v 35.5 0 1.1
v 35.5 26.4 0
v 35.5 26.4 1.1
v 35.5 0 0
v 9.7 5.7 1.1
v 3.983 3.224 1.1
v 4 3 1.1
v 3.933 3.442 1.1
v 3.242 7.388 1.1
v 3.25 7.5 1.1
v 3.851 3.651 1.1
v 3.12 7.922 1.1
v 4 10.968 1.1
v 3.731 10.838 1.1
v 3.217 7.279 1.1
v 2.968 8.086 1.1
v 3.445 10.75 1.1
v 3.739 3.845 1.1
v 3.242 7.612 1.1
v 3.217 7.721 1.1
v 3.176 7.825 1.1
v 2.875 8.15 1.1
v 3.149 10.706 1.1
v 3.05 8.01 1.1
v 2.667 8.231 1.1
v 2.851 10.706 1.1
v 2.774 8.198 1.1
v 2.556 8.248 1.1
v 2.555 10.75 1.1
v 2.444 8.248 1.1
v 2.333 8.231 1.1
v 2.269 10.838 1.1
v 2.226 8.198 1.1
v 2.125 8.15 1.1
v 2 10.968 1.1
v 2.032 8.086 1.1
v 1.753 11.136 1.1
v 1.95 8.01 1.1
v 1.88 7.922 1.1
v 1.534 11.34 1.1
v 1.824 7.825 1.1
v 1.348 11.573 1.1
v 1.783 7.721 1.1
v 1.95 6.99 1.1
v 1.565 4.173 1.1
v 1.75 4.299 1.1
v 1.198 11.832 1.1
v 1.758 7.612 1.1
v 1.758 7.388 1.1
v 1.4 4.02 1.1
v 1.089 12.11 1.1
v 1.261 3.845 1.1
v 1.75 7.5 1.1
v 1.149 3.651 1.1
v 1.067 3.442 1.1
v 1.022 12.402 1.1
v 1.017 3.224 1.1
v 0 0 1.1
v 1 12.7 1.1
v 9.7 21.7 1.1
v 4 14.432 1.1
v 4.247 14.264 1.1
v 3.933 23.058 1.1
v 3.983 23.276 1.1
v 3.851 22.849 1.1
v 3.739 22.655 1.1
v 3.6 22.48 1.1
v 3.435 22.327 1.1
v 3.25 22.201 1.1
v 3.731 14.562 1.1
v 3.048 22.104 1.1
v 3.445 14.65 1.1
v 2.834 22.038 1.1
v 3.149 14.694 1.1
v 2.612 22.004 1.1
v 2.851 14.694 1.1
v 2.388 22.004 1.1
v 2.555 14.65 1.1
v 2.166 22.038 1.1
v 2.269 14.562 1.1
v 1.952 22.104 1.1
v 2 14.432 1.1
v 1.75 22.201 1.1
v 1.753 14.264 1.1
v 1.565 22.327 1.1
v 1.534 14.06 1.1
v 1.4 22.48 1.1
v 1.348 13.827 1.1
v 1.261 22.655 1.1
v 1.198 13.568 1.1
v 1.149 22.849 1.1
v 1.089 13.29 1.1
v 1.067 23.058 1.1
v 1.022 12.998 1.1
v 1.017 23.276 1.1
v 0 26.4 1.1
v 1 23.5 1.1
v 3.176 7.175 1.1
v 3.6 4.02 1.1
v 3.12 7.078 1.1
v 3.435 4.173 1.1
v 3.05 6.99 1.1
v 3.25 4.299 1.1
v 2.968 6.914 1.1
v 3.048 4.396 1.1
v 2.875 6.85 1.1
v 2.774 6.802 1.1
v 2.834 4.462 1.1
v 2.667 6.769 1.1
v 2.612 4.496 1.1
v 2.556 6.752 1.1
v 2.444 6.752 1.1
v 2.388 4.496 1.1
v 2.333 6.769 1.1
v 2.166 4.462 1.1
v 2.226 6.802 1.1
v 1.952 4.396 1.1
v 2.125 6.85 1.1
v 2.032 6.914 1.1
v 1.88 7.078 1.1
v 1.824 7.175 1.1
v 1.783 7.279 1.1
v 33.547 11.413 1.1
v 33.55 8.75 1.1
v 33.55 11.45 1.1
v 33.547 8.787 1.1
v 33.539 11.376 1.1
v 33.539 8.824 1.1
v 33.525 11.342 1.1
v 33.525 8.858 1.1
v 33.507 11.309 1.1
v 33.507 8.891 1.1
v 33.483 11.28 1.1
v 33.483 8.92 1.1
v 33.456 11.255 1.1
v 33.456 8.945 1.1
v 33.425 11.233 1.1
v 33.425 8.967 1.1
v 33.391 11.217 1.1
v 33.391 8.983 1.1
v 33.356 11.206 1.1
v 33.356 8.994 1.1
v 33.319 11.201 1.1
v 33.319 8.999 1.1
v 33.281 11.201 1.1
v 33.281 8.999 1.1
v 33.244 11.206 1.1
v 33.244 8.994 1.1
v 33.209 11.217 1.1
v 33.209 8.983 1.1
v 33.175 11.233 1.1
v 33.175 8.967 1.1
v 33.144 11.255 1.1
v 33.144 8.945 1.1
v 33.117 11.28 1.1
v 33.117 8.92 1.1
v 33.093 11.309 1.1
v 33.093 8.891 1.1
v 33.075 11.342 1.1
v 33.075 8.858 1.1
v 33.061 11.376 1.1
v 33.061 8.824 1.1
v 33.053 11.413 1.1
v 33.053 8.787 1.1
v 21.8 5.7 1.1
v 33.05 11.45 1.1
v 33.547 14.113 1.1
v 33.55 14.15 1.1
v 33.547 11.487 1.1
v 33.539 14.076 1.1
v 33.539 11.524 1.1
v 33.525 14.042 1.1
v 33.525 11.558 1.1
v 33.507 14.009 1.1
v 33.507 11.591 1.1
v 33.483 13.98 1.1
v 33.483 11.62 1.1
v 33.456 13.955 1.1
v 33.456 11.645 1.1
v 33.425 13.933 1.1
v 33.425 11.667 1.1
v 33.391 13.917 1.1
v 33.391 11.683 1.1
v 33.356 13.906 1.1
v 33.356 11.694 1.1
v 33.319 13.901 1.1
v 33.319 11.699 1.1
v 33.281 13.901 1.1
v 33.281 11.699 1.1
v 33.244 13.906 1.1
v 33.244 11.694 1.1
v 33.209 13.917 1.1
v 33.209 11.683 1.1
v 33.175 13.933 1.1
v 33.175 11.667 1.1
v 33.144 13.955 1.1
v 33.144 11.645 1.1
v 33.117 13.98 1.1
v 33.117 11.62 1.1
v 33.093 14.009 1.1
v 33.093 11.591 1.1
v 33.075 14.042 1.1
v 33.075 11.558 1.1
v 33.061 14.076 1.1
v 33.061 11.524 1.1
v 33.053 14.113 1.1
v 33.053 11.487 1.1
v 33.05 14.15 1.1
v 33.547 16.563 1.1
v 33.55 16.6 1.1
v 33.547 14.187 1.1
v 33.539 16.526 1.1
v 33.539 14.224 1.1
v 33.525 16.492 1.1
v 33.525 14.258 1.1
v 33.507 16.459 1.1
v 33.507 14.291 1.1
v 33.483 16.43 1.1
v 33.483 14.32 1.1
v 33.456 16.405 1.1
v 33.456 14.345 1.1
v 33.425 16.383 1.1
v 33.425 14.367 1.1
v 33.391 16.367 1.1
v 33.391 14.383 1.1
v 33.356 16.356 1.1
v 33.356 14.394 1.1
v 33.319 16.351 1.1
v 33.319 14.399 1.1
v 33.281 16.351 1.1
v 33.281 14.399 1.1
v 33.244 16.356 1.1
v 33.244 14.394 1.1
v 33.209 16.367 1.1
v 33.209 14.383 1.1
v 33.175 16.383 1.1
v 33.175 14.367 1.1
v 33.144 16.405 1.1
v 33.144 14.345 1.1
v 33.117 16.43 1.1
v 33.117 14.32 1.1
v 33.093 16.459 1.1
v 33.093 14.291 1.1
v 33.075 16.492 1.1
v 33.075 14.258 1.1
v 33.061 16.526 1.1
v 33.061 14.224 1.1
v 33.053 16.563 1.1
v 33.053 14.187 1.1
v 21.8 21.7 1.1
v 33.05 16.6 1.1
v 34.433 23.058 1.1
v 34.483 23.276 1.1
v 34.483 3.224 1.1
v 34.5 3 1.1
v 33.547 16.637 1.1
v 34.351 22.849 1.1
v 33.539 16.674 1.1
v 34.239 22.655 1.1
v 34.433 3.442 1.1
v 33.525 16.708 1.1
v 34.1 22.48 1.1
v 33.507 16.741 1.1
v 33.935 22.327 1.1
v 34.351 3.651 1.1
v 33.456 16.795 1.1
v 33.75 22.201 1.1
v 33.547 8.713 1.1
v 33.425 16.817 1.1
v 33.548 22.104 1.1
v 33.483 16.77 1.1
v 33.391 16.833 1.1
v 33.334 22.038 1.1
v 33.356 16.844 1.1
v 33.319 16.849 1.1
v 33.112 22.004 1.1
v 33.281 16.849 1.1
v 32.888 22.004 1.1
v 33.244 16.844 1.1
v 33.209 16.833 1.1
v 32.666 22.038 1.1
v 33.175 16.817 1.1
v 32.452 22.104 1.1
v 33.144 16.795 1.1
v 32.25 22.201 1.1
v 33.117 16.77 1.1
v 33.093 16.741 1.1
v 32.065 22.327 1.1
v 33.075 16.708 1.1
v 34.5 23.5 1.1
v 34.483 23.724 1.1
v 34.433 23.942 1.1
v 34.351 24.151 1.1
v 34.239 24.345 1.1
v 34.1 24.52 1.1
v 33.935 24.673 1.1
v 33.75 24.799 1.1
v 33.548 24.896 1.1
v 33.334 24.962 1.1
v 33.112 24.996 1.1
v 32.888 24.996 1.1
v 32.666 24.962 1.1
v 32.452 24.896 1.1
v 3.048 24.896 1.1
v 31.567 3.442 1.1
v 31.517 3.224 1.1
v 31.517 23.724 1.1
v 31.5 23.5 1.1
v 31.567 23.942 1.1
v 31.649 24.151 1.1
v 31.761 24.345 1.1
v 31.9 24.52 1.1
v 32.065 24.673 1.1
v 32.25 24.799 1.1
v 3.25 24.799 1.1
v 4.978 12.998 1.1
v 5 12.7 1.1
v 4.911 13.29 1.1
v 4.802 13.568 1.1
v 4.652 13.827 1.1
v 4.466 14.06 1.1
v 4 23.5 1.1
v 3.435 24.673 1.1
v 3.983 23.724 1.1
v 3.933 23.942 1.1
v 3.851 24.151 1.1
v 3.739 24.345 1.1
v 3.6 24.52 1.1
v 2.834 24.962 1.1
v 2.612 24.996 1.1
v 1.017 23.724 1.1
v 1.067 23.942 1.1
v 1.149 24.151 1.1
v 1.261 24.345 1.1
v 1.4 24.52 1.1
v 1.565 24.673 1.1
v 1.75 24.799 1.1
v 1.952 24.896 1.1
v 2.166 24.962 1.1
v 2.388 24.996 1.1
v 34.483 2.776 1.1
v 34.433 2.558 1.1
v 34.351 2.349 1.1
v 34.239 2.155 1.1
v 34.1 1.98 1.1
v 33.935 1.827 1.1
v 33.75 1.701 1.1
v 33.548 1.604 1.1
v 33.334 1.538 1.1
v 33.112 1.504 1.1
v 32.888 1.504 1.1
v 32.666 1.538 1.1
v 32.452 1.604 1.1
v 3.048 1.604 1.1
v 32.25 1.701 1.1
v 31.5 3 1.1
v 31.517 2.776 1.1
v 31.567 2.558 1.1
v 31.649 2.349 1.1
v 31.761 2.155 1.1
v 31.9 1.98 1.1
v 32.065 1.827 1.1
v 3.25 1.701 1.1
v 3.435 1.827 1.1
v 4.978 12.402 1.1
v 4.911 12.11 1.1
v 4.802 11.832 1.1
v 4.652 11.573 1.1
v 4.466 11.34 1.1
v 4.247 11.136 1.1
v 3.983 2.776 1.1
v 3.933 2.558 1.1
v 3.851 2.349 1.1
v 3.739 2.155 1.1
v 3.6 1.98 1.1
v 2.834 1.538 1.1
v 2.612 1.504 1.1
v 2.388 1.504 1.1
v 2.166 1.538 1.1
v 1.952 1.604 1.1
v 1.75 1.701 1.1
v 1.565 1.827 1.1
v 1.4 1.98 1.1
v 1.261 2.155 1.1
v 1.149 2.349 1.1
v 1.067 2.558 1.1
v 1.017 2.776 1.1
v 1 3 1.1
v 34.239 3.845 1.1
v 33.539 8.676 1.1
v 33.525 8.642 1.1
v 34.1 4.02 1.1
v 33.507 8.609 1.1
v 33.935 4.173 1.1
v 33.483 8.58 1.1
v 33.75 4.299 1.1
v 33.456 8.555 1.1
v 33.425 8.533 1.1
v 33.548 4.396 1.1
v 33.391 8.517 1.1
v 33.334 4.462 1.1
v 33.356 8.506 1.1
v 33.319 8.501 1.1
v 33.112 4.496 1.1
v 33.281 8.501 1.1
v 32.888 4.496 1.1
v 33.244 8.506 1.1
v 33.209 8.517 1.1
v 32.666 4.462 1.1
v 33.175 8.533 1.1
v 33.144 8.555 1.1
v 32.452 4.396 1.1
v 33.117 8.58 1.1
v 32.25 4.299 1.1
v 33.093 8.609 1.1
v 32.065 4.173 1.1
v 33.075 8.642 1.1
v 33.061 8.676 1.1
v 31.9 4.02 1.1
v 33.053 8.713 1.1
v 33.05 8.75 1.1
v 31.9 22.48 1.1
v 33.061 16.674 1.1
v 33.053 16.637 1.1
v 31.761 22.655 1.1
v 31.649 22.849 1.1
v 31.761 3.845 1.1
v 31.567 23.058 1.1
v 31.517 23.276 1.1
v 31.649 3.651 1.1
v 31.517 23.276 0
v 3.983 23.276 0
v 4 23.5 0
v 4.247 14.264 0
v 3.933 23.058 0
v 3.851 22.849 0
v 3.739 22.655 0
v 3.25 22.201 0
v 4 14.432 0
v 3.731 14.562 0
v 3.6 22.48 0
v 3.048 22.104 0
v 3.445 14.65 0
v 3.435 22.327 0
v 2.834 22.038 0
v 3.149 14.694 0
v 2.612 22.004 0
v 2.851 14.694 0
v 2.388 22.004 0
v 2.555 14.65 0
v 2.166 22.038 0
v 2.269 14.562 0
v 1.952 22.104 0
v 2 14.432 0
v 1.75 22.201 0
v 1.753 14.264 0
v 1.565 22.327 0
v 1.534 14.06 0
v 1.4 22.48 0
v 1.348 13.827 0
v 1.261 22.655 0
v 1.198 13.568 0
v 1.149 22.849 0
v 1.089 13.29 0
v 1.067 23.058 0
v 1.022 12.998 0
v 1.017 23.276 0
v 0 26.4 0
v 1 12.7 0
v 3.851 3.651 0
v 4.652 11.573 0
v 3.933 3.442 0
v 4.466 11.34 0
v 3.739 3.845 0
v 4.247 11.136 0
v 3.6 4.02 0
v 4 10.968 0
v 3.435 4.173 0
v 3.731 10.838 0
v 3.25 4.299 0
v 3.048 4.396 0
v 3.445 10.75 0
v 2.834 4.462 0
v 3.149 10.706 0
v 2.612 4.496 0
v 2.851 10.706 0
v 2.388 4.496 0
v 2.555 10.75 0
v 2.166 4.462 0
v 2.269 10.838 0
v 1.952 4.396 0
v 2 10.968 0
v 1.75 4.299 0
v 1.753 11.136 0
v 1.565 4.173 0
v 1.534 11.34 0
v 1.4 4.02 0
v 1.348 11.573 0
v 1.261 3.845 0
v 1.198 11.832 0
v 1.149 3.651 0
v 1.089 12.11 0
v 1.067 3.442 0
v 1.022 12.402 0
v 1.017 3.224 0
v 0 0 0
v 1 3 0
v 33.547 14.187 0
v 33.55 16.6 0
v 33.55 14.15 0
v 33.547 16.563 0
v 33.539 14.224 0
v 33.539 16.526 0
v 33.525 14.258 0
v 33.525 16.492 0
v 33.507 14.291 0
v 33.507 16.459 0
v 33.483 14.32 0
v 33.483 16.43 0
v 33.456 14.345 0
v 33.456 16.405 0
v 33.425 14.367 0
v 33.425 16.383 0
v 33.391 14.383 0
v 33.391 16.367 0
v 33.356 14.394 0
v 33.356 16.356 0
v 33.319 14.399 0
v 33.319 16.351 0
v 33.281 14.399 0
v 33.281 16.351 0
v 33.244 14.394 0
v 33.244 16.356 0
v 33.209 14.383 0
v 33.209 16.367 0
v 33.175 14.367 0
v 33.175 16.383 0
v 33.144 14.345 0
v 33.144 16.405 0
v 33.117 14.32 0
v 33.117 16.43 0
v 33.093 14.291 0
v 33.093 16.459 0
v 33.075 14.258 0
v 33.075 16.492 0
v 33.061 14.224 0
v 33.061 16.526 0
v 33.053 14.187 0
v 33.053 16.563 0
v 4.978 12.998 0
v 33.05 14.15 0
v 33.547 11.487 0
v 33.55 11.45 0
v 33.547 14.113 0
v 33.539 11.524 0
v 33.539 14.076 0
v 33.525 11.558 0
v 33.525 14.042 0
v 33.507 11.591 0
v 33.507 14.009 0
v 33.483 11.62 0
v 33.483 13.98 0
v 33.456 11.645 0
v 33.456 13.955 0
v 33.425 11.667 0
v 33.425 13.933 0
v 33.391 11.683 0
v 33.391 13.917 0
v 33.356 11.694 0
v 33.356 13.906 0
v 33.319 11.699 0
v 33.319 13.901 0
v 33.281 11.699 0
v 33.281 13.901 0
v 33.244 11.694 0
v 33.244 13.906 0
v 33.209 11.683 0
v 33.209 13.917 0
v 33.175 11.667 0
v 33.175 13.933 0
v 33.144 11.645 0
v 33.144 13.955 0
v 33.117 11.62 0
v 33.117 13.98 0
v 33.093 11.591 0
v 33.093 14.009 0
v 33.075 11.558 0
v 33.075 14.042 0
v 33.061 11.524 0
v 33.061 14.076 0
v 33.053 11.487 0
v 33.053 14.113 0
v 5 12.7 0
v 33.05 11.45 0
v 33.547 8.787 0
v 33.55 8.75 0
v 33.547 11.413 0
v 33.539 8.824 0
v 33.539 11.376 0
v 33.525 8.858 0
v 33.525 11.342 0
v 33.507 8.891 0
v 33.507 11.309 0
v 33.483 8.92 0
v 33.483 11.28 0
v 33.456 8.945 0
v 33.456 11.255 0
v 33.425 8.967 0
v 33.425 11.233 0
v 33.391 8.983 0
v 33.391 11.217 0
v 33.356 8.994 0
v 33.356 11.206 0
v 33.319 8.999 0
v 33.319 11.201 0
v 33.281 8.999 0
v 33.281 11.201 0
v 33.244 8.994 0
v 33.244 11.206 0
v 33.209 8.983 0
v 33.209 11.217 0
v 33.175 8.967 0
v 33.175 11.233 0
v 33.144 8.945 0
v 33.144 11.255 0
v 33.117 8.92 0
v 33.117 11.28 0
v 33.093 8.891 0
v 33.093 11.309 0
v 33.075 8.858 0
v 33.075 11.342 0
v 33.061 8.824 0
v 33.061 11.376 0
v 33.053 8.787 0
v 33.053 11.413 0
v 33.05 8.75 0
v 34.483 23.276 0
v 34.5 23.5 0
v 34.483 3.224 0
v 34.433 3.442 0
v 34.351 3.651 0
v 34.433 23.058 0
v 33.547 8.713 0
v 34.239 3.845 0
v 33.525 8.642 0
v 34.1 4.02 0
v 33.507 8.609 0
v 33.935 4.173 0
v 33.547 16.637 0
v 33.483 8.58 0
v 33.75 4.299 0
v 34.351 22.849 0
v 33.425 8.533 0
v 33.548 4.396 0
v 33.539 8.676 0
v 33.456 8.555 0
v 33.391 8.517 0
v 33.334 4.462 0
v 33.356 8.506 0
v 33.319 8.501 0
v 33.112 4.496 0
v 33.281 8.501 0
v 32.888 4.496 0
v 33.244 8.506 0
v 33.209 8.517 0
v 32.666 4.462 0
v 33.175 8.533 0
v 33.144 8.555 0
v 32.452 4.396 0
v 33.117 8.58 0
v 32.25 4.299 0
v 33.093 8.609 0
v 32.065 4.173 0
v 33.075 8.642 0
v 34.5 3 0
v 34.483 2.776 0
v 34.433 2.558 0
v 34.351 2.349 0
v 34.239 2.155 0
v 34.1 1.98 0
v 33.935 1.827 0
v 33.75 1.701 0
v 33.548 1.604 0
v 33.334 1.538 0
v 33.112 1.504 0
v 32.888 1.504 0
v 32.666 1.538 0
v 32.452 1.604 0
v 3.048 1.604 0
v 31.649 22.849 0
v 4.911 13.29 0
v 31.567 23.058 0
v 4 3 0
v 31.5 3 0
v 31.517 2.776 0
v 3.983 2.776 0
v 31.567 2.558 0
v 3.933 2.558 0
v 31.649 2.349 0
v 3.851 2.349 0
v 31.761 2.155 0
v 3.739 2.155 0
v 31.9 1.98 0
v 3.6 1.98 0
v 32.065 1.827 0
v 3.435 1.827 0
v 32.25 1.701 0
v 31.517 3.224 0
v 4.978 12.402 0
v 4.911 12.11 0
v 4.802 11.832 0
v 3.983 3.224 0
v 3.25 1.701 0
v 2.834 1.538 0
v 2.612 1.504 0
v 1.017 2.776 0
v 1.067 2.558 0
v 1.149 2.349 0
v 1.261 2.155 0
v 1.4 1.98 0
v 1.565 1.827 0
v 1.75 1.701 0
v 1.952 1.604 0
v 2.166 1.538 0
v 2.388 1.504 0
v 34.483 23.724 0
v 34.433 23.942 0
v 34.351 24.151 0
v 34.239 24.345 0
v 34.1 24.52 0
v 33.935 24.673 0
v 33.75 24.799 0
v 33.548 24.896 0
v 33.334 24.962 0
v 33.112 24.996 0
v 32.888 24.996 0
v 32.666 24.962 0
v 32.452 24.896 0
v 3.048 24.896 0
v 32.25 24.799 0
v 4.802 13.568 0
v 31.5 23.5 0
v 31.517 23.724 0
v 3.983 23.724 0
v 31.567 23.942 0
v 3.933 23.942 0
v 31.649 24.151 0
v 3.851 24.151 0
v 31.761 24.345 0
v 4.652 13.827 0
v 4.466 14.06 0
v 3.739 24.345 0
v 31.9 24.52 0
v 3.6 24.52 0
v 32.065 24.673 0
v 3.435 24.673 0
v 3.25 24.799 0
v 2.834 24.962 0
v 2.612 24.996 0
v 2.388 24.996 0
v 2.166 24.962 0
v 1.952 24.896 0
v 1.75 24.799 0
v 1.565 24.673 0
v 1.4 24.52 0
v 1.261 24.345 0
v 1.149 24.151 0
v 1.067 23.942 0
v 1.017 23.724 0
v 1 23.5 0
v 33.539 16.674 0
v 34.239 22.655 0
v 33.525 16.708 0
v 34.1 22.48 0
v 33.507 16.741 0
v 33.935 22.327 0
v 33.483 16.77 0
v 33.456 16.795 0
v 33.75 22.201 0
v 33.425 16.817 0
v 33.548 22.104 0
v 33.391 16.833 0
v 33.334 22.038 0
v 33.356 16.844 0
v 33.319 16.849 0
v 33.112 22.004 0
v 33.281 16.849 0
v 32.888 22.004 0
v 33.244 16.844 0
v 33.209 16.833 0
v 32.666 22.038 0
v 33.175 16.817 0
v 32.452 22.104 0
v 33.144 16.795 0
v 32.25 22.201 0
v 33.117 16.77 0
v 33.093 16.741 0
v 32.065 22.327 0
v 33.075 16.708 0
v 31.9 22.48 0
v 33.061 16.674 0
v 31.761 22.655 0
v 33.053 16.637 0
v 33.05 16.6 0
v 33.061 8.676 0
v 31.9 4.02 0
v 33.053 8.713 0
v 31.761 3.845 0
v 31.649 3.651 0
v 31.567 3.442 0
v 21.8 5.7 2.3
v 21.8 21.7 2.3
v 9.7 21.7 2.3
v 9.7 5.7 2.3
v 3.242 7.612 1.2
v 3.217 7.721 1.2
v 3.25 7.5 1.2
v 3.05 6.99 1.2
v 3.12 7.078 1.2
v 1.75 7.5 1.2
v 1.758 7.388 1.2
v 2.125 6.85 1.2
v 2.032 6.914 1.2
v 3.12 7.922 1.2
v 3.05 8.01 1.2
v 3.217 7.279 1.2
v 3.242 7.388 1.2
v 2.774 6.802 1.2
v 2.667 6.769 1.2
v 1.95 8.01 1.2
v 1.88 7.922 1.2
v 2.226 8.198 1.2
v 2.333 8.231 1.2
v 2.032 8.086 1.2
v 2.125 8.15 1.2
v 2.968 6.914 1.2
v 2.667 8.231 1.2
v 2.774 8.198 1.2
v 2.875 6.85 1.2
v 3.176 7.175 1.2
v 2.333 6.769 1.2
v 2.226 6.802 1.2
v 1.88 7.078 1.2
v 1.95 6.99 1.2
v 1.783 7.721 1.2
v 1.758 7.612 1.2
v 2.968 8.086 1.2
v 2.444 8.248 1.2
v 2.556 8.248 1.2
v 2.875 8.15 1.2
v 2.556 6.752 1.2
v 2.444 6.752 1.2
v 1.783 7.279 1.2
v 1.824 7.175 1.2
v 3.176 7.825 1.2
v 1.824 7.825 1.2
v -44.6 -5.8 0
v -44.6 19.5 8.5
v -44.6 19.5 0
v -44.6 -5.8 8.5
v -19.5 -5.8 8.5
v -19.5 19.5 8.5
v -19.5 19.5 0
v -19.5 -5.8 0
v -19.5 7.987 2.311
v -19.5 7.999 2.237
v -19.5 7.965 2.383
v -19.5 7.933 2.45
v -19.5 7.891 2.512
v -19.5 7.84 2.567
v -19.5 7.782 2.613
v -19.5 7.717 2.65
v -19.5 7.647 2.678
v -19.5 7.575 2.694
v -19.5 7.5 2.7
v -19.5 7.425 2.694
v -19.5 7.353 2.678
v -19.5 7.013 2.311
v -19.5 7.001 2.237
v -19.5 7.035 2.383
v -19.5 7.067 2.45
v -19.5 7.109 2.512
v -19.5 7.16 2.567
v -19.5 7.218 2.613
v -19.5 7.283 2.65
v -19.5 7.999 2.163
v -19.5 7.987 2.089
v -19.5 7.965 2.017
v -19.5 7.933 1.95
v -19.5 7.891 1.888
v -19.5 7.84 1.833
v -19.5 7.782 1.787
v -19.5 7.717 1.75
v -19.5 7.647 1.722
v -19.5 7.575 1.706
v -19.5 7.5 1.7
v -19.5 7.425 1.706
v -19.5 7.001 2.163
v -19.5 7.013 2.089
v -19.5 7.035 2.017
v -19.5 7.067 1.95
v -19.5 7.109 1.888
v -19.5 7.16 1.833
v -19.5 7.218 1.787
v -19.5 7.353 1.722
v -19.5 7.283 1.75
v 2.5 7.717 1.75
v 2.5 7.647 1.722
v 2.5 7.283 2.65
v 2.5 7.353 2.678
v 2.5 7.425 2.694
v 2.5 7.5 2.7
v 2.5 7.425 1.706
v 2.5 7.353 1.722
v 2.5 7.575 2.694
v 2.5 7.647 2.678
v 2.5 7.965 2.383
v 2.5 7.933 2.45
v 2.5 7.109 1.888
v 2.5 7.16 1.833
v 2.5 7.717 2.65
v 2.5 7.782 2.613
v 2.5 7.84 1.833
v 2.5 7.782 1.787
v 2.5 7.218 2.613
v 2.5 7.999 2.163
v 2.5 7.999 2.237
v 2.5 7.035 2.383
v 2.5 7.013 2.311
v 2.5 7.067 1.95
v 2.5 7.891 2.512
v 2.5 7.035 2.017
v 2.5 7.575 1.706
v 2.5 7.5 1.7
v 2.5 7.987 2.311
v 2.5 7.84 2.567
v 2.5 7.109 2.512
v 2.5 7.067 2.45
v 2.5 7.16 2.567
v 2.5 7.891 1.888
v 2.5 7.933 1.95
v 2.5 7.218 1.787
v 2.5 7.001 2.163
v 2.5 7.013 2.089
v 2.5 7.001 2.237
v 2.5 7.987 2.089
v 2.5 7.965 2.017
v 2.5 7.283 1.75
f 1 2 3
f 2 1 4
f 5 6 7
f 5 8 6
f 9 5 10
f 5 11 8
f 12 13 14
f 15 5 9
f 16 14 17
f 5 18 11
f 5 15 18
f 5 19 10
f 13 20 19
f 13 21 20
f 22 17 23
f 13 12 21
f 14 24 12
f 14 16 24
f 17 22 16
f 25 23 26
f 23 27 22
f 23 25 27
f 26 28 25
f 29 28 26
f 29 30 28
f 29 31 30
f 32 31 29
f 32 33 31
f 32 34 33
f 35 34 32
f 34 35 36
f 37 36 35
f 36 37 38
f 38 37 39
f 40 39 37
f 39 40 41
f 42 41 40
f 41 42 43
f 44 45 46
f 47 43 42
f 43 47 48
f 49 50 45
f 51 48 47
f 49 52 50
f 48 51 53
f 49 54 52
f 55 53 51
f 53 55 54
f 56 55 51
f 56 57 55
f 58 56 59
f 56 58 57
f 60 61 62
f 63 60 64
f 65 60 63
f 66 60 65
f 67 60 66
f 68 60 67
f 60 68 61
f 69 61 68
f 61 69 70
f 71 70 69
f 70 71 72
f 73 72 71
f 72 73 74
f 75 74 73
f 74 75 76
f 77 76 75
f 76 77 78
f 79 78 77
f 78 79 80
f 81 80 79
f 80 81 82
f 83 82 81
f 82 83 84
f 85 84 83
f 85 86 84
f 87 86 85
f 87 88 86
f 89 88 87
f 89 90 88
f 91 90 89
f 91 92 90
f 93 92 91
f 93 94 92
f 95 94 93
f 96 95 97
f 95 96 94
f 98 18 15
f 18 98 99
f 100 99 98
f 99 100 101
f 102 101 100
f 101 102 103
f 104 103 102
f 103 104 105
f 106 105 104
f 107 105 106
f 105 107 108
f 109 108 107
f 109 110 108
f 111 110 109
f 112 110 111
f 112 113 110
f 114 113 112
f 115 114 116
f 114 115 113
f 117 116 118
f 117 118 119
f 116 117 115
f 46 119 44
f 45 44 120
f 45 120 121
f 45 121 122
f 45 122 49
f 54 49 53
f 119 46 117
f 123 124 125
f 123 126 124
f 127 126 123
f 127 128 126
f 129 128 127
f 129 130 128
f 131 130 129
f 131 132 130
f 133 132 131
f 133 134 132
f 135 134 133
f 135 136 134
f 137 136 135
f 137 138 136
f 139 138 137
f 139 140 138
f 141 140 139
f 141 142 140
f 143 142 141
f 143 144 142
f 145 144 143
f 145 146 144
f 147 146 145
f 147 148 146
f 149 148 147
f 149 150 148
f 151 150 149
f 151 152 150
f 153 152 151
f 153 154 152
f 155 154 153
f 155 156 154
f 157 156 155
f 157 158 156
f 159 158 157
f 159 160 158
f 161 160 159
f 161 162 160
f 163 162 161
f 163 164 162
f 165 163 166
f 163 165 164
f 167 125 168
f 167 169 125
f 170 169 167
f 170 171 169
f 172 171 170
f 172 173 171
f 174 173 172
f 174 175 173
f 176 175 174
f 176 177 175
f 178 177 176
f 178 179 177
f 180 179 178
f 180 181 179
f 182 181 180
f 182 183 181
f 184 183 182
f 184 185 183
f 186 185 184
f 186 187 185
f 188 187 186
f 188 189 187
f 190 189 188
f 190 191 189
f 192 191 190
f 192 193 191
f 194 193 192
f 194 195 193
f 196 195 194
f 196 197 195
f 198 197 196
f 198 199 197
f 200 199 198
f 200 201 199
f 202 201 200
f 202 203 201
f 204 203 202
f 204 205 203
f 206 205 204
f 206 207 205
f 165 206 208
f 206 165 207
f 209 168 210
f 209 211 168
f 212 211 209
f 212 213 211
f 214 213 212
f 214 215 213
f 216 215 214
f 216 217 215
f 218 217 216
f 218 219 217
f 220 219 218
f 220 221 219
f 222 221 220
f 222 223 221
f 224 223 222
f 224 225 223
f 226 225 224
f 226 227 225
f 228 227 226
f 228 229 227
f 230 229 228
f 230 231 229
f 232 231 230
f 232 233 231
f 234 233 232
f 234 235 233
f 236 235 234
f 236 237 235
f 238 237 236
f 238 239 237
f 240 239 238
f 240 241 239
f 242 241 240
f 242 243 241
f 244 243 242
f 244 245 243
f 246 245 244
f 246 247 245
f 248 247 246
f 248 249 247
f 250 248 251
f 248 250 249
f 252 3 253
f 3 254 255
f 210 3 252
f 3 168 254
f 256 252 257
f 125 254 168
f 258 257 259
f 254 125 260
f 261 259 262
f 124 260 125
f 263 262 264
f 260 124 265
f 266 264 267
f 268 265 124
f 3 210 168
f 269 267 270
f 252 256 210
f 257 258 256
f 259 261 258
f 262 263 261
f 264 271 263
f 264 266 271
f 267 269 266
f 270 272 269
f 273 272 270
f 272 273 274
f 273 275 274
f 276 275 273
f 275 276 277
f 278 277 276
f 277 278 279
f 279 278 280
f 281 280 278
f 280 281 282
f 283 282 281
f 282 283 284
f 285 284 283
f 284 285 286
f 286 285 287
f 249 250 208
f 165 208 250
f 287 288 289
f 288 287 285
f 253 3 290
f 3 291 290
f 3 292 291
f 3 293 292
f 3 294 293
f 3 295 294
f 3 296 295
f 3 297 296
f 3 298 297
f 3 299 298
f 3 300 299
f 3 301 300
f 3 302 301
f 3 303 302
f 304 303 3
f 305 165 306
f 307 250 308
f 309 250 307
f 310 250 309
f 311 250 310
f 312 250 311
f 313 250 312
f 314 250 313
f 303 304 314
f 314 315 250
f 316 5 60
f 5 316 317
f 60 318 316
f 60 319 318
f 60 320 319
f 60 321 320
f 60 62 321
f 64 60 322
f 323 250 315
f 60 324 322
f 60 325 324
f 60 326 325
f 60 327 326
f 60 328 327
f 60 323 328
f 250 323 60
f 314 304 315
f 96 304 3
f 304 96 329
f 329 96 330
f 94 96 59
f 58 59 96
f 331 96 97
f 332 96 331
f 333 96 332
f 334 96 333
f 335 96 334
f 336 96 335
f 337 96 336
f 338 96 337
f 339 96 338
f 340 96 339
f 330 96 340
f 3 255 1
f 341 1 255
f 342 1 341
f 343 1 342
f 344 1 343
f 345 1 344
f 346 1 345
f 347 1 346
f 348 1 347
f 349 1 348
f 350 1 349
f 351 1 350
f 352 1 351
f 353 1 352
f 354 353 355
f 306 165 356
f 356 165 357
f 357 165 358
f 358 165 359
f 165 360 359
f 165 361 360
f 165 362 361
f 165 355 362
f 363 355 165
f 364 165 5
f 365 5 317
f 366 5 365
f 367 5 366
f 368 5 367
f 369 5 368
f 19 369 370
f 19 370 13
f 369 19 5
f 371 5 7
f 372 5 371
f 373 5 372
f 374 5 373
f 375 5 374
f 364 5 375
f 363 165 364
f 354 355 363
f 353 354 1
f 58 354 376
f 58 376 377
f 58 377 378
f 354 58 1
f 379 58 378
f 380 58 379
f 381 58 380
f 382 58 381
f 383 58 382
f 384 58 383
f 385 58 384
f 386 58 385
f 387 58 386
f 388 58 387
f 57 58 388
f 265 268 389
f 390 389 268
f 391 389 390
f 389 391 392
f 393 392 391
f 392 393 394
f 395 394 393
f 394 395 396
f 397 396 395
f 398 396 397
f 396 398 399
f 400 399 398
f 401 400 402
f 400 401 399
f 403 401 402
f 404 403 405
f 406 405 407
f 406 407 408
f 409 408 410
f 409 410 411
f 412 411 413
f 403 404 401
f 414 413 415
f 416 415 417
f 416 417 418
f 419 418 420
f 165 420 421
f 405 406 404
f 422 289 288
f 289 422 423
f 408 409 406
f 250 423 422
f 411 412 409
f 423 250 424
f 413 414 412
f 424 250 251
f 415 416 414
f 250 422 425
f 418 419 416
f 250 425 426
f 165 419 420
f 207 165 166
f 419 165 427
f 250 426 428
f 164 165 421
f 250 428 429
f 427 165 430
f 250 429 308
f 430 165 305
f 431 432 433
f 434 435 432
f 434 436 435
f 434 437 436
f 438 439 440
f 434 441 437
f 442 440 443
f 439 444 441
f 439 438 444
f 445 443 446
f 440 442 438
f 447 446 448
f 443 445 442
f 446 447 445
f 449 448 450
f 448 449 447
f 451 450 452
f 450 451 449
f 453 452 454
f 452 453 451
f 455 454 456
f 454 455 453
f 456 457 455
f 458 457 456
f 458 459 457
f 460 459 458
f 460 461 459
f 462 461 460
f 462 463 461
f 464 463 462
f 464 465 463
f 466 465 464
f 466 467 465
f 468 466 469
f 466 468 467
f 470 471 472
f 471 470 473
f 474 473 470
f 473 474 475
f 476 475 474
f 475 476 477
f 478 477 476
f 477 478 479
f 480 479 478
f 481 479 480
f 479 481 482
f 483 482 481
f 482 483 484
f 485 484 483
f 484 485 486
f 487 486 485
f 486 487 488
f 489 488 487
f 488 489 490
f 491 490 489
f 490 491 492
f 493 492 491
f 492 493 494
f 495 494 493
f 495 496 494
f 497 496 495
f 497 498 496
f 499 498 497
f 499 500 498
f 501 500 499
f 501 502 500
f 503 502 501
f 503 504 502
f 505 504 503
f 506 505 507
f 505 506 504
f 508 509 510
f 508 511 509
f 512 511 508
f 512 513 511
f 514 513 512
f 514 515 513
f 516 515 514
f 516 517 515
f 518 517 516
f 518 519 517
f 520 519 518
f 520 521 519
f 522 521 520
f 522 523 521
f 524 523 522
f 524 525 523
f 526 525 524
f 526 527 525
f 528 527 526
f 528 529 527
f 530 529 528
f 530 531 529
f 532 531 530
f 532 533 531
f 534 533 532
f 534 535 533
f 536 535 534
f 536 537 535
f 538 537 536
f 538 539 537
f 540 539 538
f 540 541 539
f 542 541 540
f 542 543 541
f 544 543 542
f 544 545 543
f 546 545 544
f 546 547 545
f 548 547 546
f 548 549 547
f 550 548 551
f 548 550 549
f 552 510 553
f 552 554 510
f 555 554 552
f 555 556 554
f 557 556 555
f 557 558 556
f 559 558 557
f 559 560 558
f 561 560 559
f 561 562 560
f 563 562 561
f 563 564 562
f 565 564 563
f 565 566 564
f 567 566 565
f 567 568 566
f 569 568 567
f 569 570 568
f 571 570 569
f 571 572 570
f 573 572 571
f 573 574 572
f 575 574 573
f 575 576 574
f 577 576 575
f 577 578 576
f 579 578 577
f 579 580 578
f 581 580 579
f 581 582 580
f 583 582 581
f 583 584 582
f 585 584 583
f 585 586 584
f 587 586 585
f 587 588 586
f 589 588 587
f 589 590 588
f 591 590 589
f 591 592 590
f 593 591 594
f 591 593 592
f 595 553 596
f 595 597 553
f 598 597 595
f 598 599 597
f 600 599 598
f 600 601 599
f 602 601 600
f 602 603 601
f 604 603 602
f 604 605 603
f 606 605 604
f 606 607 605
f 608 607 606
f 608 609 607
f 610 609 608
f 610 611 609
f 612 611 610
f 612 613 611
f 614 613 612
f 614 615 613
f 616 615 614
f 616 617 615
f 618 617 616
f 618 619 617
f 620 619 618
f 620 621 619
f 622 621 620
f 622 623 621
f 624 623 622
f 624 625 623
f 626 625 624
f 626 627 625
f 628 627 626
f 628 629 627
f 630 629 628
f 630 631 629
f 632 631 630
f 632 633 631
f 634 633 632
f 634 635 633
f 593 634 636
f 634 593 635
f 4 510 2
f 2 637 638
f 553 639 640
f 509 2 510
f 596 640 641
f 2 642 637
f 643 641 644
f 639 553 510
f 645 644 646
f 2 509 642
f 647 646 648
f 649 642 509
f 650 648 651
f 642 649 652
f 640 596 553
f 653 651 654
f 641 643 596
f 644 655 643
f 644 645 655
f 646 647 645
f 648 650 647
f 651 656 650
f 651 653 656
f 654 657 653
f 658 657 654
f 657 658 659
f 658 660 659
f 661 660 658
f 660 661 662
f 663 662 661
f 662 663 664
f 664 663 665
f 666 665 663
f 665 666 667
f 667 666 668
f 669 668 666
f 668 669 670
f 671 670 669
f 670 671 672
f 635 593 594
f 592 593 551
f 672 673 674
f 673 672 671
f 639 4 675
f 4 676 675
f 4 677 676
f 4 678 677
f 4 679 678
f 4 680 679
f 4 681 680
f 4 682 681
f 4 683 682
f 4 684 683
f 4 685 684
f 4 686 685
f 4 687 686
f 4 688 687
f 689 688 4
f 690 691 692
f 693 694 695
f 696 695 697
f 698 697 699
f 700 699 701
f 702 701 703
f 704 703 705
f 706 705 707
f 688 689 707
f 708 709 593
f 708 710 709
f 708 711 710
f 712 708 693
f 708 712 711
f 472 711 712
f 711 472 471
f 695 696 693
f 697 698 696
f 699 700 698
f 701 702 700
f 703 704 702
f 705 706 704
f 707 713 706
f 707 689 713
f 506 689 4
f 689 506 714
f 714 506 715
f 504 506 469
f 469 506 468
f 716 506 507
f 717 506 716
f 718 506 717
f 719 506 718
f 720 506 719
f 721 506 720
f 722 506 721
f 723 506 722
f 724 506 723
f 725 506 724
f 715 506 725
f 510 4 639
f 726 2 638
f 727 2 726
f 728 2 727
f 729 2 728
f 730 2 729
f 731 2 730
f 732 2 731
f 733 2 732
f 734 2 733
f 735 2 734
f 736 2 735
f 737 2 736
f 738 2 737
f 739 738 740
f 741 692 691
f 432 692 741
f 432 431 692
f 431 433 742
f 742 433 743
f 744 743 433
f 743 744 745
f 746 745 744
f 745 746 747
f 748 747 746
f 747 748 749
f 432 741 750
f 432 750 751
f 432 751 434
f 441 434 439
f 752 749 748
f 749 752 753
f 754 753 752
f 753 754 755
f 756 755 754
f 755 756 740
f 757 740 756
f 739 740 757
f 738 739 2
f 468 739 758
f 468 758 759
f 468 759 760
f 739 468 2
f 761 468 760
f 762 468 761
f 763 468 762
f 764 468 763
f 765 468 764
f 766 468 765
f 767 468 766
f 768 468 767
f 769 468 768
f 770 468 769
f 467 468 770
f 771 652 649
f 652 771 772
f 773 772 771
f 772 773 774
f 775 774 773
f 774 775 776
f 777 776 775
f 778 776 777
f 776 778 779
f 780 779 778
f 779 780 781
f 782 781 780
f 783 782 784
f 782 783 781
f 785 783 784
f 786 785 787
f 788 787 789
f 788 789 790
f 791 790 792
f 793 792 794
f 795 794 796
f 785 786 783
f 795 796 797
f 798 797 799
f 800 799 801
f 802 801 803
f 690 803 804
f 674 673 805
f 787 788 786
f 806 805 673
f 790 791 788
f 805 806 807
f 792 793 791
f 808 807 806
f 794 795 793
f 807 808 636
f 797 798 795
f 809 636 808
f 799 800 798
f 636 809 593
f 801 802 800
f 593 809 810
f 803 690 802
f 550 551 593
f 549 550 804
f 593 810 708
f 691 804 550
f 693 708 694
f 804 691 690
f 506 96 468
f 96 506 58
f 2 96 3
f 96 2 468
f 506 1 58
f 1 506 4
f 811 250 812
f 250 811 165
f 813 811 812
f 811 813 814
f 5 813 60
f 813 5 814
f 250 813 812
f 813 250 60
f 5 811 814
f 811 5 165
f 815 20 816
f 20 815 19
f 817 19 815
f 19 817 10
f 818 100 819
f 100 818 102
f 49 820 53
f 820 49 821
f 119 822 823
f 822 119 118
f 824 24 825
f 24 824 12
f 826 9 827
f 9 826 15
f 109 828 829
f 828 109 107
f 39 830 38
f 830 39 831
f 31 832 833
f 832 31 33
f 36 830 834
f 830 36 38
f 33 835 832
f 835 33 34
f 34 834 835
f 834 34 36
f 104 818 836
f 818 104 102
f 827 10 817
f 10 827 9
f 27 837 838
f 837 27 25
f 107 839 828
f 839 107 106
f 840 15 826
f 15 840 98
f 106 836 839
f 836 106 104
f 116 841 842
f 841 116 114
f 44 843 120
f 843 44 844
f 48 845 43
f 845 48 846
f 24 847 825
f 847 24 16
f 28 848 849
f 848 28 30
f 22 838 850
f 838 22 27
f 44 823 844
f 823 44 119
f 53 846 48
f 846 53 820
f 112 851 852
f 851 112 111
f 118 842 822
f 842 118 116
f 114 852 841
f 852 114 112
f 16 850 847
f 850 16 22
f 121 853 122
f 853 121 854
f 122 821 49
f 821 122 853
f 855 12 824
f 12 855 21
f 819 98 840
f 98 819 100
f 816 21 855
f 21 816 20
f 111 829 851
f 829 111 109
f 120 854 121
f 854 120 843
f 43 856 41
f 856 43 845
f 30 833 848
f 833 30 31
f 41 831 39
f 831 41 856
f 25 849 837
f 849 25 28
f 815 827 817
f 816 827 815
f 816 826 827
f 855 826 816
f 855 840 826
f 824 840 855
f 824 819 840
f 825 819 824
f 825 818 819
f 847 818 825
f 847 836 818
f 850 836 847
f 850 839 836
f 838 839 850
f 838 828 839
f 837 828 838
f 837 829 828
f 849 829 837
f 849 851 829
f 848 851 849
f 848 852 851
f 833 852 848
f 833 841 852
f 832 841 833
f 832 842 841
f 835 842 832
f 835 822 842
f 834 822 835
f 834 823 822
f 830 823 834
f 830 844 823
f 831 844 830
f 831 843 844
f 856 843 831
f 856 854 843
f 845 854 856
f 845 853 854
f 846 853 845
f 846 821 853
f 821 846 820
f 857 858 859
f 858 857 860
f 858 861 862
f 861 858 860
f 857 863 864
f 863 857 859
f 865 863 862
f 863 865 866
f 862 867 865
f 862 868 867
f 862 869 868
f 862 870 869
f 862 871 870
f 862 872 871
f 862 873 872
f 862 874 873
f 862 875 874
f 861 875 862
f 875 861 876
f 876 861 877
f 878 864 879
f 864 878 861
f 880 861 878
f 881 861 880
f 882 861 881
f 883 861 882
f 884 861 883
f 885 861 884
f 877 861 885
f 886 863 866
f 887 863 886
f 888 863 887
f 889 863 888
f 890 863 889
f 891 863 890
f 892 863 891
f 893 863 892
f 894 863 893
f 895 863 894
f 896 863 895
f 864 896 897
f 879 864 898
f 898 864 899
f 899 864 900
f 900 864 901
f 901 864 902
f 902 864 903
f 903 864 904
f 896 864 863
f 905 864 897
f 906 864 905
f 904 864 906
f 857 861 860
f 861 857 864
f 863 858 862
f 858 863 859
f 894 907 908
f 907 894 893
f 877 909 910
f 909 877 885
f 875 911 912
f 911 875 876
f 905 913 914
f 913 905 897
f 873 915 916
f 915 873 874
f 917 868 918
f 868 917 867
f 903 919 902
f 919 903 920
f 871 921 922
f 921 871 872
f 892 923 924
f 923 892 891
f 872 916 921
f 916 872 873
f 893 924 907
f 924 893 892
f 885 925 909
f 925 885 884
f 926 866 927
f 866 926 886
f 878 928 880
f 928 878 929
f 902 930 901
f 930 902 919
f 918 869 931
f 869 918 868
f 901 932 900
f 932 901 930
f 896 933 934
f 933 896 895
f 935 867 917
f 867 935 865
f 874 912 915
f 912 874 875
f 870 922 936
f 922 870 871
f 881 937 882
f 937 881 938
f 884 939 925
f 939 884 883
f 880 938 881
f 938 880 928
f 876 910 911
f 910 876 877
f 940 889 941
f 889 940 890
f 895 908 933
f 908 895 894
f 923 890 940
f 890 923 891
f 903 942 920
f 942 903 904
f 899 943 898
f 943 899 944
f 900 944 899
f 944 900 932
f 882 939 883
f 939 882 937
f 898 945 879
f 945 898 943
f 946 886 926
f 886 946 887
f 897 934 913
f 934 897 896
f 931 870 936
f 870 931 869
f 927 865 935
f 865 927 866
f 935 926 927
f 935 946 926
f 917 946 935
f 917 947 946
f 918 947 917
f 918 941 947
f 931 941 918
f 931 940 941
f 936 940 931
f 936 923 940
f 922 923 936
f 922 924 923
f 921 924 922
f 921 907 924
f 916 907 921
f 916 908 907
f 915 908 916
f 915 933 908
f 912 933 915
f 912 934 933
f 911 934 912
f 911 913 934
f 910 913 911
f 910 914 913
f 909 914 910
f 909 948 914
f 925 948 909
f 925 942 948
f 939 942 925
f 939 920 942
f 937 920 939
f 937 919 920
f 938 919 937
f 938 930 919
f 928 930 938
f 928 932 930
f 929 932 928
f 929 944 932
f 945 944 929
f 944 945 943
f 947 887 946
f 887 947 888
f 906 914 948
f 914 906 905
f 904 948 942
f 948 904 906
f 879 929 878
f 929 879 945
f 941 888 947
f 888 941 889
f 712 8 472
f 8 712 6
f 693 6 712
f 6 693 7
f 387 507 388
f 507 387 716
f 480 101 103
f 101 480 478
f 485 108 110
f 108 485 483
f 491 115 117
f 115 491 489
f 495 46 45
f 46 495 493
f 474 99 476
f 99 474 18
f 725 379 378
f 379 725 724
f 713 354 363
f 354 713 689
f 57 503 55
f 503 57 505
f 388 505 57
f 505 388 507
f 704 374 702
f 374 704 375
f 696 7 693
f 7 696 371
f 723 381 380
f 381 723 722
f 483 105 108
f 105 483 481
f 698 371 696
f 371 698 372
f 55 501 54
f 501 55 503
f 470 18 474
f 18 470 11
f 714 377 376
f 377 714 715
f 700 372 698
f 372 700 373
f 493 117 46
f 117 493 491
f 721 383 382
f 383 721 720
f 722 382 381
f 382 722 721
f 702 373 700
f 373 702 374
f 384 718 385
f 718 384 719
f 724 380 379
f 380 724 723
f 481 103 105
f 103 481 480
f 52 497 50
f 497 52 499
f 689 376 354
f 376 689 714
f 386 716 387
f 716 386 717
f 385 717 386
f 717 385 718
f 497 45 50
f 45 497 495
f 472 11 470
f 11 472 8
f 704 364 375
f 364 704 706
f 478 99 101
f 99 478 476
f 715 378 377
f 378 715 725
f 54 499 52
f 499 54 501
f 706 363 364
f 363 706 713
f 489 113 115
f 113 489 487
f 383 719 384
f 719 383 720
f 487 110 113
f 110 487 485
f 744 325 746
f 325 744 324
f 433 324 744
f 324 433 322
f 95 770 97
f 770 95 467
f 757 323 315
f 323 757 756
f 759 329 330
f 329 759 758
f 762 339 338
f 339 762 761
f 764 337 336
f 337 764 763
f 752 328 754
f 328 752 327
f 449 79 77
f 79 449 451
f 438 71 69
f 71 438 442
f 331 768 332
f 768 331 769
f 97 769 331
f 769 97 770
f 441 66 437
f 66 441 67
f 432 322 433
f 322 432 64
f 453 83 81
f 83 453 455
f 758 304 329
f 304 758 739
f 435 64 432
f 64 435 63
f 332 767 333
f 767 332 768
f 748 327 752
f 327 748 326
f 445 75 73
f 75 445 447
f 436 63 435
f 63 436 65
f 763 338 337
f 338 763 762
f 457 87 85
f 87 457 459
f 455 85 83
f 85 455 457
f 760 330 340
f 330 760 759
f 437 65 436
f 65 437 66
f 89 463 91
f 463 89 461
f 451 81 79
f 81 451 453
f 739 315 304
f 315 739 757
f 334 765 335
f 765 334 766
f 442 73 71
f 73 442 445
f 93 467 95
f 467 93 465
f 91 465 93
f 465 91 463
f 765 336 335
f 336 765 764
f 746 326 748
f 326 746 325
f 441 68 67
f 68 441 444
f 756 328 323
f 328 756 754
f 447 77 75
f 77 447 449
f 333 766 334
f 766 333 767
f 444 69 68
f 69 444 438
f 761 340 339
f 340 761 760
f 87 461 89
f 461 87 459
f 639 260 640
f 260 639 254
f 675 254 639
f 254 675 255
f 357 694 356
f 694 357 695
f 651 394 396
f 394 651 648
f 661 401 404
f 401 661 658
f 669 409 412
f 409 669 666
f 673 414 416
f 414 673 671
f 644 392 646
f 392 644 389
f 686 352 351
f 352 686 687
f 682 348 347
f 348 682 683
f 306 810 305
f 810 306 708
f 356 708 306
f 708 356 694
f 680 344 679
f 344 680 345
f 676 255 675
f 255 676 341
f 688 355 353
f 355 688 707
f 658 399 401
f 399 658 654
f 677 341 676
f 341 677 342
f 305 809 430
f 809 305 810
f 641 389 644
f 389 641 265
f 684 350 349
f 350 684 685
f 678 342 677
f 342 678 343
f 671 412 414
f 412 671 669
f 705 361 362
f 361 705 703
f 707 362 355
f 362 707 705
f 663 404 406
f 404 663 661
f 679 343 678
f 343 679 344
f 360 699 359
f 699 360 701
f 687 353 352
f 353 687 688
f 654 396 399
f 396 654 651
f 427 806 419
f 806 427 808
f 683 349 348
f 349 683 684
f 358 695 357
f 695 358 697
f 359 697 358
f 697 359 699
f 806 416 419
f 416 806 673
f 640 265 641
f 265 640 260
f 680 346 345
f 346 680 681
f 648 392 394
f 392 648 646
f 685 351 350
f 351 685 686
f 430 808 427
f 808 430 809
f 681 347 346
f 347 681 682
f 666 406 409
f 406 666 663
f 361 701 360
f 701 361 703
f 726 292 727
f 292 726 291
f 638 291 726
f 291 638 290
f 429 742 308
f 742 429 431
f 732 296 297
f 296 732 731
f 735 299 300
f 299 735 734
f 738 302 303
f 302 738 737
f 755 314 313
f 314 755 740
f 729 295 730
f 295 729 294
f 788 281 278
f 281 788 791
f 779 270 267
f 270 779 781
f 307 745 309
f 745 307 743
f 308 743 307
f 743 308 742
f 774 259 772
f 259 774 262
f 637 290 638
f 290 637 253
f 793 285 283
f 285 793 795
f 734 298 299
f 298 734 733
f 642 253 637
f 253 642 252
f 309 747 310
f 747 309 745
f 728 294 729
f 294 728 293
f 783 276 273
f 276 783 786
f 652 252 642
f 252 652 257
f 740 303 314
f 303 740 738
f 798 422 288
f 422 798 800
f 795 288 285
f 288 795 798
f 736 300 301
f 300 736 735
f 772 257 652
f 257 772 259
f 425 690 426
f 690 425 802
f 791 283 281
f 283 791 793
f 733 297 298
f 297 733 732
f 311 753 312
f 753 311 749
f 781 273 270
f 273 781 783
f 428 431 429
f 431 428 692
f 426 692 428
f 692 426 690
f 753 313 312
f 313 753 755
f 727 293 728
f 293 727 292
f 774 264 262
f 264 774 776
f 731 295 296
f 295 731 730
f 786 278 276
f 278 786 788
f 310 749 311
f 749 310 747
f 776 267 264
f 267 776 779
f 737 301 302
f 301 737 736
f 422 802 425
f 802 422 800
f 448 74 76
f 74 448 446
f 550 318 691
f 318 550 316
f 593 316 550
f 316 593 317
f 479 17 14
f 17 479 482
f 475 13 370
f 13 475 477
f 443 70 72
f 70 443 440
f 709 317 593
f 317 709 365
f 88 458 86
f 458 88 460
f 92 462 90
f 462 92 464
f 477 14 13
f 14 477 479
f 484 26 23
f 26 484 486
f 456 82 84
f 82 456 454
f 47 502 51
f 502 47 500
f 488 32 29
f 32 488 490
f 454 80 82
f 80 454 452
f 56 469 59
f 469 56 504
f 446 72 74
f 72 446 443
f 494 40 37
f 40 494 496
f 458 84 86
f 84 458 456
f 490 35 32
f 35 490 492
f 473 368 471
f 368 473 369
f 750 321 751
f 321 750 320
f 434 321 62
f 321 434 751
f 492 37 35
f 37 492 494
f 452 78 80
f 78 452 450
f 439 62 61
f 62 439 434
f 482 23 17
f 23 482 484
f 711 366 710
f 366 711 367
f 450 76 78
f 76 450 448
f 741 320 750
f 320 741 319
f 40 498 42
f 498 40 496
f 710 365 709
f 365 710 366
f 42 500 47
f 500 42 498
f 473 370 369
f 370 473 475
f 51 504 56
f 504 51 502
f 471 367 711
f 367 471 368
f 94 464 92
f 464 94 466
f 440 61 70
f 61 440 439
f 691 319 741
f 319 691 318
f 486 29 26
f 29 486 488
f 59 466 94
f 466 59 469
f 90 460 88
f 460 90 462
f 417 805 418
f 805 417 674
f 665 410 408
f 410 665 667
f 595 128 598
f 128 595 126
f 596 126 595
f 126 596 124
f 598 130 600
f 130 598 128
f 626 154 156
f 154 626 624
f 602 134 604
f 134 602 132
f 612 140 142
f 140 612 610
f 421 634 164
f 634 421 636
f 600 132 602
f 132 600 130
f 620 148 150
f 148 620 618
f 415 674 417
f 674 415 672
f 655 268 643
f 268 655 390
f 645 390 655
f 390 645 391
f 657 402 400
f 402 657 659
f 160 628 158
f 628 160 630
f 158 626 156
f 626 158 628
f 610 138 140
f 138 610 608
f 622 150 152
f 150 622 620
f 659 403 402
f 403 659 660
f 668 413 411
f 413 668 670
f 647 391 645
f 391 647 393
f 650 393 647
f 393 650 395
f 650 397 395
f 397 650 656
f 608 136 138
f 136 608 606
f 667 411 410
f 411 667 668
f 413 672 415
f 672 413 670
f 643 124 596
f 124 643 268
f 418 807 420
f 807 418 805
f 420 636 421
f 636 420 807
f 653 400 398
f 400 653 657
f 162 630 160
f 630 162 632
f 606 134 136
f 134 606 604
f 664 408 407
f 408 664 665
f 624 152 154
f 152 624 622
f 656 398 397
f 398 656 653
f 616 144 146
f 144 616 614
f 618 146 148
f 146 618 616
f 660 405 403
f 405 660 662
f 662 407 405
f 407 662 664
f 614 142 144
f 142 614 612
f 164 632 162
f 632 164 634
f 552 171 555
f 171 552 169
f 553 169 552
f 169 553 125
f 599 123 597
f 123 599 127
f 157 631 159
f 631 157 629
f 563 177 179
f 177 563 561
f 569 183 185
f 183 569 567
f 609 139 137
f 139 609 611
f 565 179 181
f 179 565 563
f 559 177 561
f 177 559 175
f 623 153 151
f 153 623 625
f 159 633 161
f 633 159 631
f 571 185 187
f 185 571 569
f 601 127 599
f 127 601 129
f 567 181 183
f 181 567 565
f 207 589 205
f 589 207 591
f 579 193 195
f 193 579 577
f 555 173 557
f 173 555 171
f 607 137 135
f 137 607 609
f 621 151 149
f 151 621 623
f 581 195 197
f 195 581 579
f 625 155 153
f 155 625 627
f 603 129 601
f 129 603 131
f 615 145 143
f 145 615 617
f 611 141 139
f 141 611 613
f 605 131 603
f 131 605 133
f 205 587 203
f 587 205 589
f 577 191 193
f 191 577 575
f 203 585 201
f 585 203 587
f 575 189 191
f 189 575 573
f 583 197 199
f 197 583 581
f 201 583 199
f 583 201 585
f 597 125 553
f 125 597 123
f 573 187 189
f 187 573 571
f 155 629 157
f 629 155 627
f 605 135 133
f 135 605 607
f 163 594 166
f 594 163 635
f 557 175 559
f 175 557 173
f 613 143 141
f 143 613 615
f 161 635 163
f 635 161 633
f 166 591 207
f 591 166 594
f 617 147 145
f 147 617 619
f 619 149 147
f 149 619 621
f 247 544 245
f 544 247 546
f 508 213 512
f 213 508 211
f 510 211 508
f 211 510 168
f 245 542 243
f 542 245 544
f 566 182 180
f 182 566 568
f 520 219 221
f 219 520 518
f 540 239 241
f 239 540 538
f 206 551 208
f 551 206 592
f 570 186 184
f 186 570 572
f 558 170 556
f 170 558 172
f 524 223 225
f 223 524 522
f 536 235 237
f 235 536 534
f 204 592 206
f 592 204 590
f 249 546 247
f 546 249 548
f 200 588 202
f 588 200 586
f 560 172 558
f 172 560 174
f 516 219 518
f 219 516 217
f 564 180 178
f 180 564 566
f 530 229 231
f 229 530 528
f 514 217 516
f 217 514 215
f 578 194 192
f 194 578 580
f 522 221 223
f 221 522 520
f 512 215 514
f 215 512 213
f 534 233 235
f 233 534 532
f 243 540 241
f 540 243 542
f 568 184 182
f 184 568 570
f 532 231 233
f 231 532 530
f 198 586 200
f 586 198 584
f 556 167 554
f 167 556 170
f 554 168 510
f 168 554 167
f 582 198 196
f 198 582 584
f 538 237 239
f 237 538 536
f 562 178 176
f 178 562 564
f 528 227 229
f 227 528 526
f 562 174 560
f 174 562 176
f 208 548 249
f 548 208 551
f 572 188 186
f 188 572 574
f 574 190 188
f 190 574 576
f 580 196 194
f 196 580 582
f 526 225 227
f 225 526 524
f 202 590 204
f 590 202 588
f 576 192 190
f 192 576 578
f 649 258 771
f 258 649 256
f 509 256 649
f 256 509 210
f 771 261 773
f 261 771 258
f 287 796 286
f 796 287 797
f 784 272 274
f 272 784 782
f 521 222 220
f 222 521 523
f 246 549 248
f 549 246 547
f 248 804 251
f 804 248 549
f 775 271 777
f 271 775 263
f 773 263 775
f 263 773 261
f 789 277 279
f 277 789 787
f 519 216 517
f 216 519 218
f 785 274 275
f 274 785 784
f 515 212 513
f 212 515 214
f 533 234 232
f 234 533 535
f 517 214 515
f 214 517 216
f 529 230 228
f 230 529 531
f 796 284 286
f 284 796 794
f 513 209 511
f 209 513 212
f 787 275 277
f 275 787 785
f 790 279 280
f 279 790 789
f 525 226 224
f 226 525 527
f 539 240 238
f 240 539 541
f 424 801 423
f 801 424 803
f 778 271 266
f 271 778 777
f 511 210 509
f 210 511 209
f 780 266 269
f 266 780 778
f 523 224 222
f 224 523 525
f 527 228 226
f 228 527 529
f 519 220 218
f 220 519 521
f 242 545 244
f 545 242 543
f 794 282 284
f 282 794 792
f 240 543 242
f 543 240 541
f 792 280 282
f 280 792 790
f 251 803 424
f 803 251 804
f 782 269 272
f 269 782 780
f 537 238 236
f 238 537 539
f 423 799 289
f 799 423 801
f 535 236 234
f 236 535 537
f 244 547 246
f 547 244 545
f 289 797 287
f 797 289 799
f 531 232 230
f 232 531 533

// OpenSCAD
$fn = 42;

difference(){
	union() {
		union() {
			union() {
				union() {
					union() {
						union() {
							union() {
								union() {
									union() {
										union() {
											union() {
												union() {
													cube(size = [35.5000000000, 26.4000000000, 1.1000000000]);
													translate(v = [2.5000000000, 0, 0]) {
														translate(v = [0, 3, 0]) {
														}
													}
												}
												translate(v = [2.5000000000, 0, 0]) {
													translate(v = [0, 23.5000000000, 0]) {
													}
												}
											}
											translate(v = [33, 0, 0]) {
												translate(v = [0, 3, 0]) {
												}
											}
										}
										translate(v = [33, 0, 0]) {
											translate(v = [0, 23.5000000000, 0]) {
											}
										}
									}
									translate(v = [3, 0, 0]) {
										translate(v = [0, 12.7000000000, 0]) {
										}
									}
								}
								translate(v = [9.7000000000, 0, 0]) {
									translate(v = [0, 5.7000000000, 0]) {
										cube(size = [12.1000000000, 16, 2.3000000000]);
									}
								}
							}
							translate(v = [2.5000000000, 0, 0]) {
								translate(v = [0, 7.5000000000, 0]) {
									cylinder(d = 1.5000000000, h = 1.2000000000);
								}
							}
						}
						translate(v = [0, 8.7500000000, 0]) {
							translate(v = [33.3000000000, 0, 0]) {
							}
						}
					}
					translate(v = [0, 11.4500000000, 0]) {
						translate(v = [33.3000000000, 0, 0]) {
						}
					}
				}
				translate(v = [0, 14.1500000000, 0]) {
					translate(v = [33.3000000000, 0, 0]) {
					}
				}
			}
			translate(v = [0, 16.6000000000, 0]) {
				translate(v = [33.3000000000, 0, 0]) {
				}
			}
		}
		rotate(a = [0, 0, 180]) {
			translate(v = [19.5000000000, 0, 0]) {
				translate(v = [0, -19.5000000000, 0]) {
					union() {
						cube(size = [25.1000000000, 25.3000000000, 8.5000000000]);
						translate(v = [0, 0, 2.2000000000]) {
							translate(v = [0, 12, 0]) {
								rotate(a = [0, 270, 0]) {
									cylinder(d = 1, h = 22);
								}
							}
						}
					}
				}
			}
		}
	}
	/* Holes Below*/
	union(){
		union(){
			union(){
				union(){
					union(){
						union(){
							union(){
								union(){
									union(){
										union(){
											union(){
												union(){
													translate(v = [2.5000000000, 0, 0]){
														translate(v = [0, 3, 0]){
															translate(v = [0, 0, -20]) {
																cylinder(d = 3, h = 50);
															}
														}
													}
												}
												translate(v = [2.5000000000, 0, 0]){
													translate(v = [0, 23.5000000000, 0]){
														translate(v = [0, 0, -20]) {
															cylinder(d = 3, h = 50);
														}
													}
												}
											}
											translate(v = [33, 0, 0]){
												translate(v = [0, 3, 0]){
													translate(v = [0, 0, -20]) {
														cylinder(d = 3, h = 50);
													}
												}
											}
										}
										translate(v = [33, 0, 0]){
											translate(v = [0, 23.5000000000, 0]){
												translate(v = [0, 0, -20]) {
													cylinder(d = 3, h = 50);
												}
											}
										}
									}
									translate(v = [3, 0, 0]){
										translate(v = [0, 12.7000000000, 0]){
											translate(v = [0, 0, -20]) {
												cylinder(d = 4, h = 50);
											}
										}
									}
								}
							}
						}
						translate(v = [0, 8.7500000000, 0]){
							translate(v = [33.3000000000, 0, 0]){
								cylinder(d = 0.5000000000, h = 50);
							}
						}
					}
					translate(v = [0, 11.4500000000, 0]){
						translate(v = [33.3000000000, 0, 0]){
							cylinder(d = 0.5000000000, h = 50);
						}
					}
				}
				translate(v = [0, 14.1500000000, 0]){
					translate(v = [33.3000000000, 0, 0]){
						cylinder(d = 0.5000000000, h = 50);
					}
				}
			}
			translate(v = [0, 16.6000000000, 0]){
				translate(v = [33.3000000000, 0, 0]){
					cylinder(d = 0.5000000000, h = 50);
				}
			}
		}
	} /* End Holes */ 
}
/***********************************************
*********      SolidPython code:      **********
************************************************
 
from os.path import join
from solid.utils import *

SEGMENTS = 42
HAS_PINS = False
PINS_BACKSIDE = True
HAS_ANTENNA = True
ANTENNA_ANGLE = 90


def assemble():
    print "assembling"
    base = cube([35.5, 26.4, 1.1])

    print "punching holes"
    _hole_cylinder = hole()(down(20)(cylinder(d=3, h=50)))
    base += right(2.5)(forward(3)(_hole_cylinder))
    base += right(2.5)(forward(23.5)(_hole_cylinder))
    base += right(33)(forward(3)(_hole_cylinder))
    base += right(33)(forward(23.5)(_hole_cylinder))

    _big_hole = hole()(down(20)(cylinder(d=4, h=50)))
    base += right(3)(forward(12.7)(_big_hole))

    print "attaching main chip"
    base += right(9.7)(forward(5.7)(cube([12.1, 16, 2.3])))

    print "attaching antenna connector"
    base += right(2.5)(forward(7.5)(cylinder(d=1.5, h=1.2)))

    if HAS_PINS:
        _pins = cube([2.5, 2.5, 8])
        if PINS_BACKSIDE:
            _pins = down(2.5)(_pins)
        else:
            _pins = up(1.1)(_pins)
        base += right(33.3)(forward(8)(_pins))
    else:
        _pin_hole = right(33.3)(hole()(cylinder(d=0.5, h=50)))
        base += forward(8.75)(_pin_hole)
        base += forward(11.45)(_pin_hole)
        base += forward(14.15)(_pin_hole)
        base += forward(16.6)(_pin_hole)

    if HAS_ANTENNA:
        _antenna = cube([25.1, 25.3, 8.5])
        _antenna_cable = rotate([0, 270, 0])(cylinder(d=1, h=22))
        _antenna += up(2.2)(forward(12)(_antenna_cable))
        base += rotate([0, 0, ANTENNA_ANGLE*2])(right(19.5)(back(19.5)(_antenna)))

    return base


if __name__ == '__main__':
    scad_render_to_file(assemble(), join('./out/', "gy-gps6mv2.scad"), file_header='$fn = %s;' % SEGMENTS)
 
 
************************************************/
